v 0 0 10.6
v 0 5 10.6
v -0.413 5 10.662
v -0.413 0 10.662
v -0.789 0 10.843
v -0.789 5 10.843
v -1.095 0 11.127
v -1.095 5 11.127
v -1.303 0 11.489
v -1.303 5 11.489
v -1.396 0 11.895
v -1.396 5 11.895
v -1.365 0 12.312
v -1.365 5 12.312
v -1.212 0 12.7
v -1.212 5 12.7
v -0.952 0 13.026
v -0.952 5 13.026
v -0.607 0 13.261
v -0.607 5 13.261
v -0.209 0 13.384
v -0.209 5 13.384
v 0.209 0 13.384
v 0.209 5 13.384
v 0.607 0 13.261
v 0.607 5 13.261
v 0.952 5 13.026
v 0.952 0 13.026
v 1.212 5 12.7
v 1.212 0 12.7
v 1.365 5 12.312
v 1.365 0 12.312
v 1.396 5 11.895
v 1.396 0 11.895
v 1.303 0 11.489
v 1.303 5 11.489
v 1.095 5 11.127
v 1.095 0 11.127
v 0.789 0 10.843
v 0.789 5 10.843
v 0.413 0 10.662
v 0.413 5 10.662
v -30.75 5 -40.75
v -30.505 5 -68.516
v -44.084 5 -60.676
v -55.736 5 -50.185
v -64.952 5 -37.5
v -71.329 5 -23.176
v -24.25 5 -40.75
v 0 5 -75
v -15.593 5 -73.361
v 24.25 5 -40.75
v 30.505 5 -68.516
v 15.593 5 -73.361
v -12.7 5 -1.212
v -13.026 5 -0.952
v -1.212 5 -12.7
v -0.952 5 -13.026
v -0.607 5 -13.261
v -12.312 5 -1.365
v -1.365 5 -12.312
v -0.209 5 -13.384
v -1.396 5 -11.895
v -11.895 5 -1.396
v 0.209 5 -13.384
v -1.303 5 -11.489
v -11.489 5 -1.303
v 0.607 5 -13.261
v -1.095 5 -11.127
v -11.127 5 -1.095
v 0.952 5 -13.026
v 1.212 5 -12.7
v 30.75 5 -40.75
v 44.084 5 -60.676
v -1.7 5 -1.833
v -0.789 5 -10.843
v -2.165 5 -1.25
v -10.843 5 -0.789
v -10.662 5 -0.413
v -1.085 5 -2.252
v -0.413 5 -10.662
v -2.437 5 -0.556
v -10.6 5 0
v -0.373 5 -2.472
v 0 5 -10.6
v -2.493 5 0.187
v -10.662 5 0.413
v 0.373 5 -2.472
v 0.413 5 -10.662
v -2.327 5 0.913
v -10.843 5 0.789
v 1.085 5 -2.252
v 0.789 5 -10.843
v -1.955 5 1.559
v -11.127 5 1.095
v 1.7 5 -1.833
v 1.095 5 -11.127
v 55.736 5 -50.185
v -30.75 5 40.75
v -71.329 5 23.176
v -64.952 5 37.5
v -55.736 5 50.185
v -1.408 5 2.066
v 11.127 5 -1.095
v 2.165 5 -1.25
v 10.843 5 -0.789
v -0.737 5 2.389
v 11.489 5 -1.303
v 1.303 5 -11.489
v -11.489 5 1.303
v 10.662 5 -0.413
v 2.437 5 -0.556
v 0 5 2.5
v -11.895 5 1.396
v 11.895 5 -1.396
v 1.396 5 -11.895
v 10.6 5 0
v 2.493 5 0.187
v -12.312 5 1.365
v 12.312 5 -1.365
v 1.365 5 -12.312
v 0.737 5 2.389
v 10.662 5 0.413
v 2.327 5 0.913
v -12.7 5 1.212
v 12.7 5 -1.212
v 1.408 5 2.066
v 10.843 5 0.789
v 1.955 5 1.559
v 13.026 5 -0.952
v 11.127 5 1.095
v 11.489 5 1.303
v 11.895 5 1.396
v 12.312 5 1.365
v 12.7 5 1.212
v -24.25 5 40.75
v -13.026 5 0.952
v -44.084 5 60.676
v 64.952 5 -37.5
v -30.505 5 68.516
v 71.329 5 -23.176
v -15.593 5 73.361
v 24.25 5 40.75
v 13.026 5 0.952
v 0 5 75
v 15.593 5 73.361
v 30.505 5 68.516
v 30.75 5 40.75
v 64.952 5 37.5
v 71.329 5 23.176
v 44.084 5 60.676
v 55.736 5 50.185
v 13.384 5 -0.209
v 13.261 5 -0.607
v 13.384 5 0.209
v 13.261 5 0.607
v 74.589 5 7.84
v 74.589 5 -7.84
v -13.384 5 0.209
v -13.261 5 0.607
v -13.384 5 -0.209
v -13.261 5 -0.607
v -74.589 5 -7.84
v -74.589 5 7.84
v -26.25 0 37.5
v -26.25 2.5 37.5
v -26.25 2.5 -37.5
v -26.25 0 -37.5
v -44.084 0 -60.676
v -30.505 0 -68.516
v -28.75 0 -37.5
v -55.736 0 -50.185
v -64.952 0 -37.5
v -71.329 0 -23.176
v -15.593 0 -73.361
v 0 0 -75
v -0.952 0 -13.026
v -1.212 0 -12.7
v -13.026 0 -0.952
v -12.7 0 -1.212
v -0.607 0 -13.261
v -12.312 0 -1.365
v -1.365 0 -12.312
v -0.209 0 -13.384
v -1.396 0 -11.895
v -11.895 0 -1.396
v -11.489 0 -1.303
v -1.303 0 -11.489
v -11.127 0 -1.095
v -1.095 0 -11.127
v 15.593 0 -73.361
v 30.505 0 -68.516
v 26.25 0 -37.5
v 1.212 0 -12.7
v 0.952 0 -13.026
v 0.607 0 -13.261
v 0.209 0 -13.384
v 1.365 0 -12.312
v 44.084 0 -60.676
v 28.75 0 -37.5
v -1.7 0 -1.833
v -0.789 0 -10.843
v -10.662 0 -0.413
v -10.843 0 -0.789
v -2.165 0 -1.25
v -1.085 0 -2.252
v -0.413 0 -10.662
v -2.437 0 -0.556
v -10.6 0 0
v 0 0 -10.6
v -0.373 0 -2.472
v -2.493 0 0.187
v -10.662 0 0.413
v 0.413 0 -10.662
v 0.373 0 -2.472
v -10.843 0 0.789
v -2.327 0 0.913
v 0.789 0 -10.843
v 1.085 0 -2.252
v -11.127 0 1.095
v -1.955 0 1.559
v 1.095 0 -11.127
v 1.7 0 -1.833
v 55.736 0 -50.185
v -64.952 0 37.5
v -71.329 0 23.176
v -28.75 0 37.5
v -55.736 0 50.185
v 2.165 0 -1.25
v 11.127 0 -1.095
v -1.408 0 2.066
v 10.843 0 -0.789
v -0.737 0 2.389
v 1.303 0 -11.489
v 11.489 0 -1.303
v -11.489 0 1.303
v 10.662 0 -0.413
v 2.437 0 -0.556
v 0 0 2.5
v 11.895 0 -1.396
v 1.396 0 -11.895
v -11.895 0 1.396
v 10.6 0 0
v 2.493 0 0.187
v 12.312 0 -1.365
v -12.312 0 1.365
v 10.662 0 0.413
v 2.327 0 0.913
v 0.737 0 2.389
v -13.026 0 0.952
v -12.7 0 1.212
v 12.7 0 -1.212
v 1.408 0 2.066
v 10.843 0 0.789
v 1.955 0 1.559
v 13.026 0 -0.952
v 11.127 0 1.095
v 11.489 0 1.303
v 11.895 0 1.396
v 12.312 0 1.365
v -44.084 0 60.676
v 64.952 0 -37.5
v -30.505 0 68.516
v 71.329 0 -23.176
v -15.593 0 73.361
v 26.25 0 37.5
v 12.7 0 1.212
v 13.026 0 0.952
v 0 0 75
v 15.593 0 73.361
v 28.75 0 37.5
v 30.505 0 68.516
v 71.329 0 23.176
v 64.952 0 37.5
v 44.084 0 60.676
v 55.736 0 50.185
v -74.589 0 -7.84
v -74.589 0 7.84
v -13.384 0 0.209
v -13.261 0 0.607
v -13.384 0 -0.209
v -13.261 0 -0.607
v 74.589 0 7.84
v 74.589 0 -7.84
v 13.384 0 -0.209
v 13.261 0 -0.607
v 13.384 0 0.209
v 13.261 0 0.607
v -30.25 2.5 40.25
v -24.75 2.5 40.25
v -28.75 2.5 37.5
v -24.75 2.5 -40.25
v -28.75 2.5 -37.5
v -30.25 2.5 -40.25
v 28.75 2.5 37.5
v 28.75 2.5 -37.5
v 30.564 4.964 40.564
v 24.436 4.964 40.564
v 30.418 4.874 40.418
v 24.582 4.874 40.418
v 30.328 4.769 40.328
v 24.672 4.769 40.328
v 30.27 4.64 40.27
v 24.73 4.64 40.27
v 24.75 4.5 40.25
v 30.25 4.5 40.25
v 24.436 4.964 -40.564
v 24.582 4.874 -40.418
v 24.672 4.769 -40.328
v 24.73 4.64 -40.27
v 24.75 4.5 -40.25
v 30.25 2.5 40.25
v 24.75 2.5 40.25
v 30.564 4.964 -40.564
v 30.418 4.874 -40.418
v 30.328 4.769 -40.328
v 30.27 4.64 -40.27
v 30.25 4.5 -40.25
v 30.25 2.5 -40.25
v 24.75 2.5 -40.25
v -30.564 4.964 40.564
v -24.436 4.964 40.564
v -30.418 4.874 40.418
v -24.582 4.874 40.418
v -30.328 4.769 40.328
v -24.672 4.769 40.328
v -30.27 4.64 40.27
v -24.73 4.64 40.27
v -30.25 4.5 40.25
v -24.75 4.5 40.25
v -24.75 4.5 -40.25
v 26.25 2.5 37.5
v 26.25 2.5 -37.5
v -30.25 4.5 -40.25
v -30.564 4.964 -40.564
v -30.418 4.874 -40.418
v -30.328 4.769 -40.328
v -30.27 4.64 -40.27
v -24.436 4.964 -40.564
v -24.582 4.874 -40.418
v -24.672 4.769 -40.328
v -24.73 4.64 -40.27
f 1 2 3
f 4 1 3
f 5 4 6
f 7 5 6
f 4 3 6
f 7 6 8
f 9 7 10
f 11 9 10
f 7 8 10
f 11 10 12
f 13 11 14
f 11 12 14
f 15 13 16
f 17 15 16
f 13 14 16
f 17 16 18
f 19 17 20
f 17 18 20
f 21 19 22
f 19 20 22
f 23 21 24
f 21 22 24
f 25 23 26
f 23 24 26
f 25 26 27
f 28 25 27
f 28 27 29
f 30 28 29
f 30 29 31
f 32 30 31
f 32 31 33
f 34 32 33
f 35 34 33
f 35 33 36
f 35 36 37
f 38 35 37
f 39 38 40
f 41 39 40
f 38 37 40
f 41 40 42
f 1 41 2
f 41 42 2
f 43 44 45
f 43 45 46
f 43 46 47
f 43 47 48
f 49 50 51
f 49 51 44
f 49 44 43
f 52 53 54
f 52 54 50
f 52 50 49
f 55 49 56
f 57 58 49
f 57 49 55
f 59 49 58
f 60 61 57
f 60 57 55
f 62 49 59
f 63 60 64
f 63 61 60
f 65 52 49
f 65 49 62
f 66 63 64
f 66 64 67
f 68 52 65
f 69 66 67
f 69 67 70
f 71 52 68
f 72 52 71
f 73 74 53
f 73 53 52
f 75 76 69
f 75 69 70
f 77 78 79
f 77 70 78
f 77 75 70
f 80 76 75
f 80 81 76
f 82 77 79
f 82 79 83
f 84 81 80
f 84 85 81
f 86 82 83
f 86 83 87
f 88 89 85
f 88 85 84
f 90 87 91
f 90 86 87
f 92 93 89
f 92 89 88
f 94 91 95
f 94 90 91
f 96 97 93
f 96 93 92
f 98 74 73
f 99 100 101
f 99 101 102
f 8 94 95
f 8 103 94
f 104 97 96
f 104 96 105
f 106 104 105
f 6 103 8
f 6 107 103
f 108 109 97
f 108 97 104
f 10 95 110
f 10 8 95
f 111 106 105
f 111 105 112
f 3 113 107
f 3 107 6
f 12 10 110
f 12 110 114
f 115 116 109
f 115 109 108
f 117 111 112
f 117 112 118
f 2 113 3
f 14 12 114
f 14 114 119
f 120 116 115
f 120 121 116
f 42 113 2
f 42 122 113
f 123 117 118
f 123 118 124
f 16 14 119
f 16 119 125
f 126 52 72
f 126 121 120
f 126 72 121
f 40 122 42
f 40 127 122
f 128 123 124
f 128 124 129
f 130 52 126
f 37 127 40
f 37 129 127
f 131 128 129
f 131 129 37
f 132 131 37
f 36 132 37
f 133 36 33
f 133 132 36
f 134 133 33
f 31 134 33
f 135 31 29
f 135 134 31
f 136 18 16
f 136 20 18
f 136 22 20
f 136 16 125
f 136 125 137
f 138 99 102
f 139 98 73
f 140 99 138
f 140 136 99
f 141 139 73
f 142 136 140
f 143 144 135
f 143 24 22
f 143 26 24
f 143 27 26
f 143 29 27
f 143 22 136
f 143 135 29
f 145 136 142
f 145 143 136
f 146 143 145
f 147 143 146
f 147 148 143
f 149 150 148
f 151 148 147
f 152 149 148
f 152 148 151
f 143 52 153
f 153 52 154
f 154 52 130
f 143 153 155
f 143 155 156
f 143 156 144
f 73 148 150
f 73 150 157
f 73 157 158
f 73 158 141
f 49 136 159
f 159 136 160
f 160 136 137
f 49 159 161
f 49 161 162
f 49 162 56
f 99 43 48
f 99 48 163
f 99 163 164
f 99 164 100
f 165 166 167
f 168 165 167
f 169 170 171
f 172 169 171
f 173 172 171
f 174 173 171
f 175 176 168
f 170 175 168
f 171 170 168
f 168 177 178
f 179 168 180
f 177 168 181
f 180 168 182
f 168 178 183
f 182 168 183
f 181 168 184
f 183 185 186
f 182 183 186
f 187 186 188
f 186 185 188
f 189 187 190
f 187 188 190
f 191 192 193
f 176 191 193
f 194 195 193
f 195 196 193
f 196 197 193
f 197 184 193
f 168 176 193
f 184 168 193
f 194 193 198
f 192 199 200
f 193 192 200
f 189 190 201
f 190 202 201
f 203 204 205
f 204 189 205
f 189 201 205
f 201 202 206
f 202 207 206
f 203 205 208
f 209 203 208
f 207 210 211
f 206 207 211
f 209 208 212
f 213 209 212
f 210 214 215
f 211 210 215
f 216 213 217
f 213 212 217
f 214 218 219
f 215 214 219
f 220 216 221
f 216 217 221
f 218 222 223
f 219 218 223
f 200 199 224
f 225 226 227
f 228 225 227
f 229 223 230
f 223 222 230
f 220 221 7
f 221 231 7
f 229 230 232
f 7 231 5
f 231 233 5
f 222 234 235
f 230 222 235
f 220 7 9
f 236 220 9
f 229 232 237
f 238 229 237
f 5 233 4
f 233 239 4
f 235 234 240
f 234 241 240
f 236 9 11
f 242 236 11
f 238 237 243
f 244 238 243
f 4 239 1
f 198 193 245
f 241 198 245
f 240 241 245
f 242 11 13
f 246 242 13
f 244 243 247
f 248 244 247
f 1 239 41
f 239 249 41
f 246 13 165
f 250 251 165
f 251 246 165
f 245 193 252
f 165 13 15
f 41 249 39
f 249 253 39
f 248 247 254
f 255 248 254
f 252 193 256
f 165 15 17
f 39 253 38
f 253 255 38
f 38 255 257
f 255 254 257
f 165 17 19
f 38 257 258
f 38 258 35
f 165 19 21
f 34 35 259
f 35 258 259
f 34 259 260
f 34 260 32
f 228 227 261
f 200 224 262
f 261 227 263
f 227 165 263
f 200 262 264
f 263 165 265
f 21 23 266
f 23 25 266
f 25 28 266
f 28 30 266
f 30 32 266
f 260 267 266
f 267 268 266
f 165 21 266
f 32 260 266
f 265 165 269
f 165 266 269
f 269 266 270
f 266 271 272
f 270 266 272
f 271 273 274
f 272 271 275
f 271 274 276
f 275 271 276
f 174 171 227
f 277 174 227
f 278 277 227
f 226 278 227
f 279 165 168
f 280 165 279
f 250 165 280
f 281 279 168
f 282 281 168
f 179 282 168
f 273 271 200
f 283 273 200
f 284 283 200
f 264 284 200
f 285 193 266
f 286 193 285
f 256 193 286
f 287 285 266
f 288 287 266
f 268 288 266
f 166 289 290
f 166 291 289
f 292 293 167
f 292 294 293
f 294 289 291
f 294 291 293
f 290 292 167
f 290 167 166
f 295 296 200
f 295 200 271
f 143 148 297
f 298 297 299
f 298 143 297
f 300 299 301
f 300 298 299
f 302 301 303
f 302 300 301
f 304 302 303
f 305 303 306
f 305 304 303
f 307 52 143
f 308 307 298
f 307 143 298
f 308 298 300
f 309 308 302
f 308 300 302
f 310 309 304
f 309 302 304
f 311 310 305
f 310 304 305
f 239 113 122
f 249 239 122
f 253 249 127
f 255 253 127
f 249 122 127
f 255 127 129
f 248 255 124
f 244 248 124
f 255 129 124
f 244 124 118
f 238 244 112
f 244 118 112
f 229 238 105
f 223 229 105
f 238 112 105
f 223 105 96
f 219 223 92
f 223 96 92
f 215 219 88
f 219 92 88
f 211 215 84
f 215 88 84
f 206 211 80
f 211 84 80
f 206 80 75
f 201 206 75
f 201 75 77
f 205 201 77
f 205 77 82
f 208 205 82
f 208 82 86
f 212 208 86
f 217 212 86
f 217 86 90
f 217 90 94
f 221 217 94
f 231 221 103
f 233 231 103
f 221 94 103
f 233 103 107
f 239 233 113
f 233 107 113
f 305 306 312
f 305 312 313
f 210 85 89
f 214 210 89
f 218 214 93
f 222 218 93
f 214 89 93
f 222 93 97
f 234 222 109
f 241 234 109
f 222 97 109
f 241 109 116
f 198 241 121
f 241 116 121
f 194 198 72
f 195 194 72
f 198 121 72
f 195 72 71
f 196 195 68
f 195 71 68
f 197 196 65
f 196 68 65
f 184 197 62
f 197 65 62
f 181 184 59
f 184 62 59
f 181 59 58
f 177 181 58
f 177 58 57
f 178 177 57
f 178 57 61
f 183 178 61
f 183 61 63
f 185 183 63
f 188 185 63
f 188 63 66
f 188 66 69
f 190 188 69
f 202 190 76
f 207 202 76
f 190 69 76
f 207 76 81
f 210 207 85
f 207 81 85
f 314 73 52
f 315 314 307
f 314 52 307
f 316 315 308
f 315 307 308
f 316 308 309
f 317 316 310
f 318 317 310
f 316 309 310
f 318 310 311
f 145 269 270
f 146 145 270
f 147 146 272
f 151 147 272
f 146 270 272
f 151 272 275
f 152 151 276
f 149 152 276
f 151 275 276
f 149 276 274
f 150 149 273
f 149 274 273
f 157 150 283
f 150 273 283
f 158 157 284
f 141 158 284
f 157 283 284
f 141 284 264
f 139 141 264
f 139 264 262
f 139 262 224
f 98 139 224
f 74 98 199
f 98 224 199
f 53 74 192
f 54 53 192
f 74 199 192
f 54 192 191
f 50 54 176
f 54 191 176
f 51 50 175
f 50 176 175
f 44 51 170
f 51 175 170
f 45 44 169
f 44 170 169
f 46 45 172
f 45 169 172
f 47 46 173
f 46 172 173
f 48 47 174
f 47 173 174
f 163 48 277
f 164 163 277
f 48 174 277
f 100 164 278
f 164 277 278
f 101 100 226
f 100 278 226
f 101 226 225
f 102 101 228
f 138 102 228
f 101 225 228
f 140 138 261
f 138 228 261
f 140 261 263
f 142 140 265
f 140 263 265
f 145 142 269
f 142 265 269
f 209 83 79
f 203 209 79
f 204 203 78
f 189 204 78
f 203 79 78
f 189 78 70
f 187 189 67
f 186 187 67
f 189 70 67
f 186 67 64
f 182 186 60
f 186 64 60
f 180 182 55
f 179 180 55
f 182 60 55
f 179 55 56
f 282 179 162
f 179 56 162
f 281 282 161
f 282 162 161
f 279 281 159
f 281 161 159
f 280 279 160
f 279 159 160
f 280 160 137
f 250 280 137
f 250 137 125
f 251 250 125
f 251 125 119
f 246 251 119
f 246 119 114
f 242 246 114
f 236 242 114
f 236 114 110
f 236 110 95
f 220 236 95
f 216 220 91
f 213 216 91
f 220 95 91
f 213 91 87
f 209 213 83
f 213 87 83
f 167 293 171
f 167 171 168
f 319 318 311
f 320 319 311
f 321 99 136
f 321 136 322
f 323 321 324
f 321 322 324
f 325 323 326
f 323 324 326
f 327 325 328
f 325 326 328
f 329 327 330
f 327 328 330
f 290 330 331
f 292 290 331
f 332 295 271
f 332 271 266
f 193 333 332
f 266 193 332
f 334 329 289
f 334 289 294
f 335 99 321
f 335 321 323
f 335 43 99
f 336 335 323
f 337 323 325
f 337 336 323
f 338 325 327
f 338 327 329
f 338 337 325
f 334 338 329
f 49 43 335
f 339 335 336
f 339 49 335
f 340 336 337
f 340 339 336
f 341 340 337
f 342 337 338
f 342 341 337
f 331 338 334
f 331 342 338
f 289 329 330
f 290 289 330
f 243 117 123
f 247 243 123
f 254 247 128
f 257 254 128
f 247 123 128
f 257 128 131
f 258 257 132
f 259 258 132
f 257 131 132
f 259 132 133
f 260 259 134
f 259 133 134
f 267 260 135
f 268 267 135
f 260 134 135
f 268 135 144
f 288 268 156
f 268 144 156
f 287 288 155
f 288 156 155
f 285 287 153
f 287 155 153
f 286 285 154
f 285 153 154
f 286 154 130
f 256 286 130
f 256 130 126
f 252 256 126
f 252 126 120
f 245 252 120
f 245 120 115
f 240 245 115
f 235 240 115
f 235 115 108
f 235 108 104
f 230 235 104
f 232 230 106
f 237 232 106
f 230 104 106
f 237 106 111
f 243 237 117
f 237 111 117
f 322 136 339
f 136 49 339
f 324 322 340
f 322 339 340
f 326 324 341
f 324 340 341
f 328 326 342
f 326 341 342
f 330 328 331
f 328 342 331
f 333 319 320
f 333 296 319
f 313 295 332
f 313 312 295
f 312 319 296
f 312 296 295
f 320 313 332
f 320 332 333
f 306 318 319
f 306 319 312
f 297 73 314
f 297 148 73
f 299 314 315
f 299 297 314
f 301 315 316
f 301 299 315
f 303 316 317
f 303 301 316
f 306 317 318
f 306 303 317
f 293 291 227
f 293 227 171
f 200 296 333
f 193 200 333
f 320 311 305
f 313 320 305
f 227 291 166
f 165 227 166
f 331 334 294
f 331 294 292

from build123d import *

# Parameters (mm, degrees)
SKETCH1_R                = 75
BOSS_EXTRUDE1_DEPTH      = 5
SKETCH2_R                = 2.5
CUT_EXTRUDE1_DEPTH       = 5
SKETCH3_R                = 1.4
CUT_EXTRUDE2_DEPTH       = 5
CIRPATTERN1_COUNT        = 4
SKETCH4_W                = 5.5
SKETCH4_H                = 80.5
CUT_EXTRUDE3_DEPTH       = 2.5
SKETCH5_W                = 2.5
SKETCH5_H                = 75
CUT_EXTRUDE4_DEPTH       = 2.5
FILLET1_R                = 0.5
CIRPATTERN2_COUNT        = 2
FILLET1_OF_CIRPATTERN2_R = 0.5


with BuildPart() as part:
    # Sketch1 → Boss-Extrude1 (new body)
    with BuildSketch(Plane(origin=(0, 0, 0), x_dir=(1, 0, 0), z_dir=(0, 1, 0))):
        with Locations(Location((0, 0, 0), (0, 0, 270))):
            Circle(SKETCH1_R)
    extrude(amount=BOSS_EXTRUDE1_DEPTH)

    # Sketch2 → Cut-Extrude1 (cut)
    with BuildSketch(Plane(origin=(0, 5, 0), x_dir=(1, 0, 0), z_dir=(0, 1, 0))):
        with Locations(Location((0, 0, 0), (0, 0, 270))):
            Circle(SKETCH2_R)
    extrude(amount=-CUT_EXTRUDE1_DEPTH, mode=Mode.SUBTRACT)

    # Sketch3 → Cut-Extrude2 (cut)
    with BuildSketch(Plane(origin=(0, 5, 0), x_dir=(1, 0, 0), z_dir=(0, 1, 0))):
        with Locations(Location((0, 12, 0), (0, 0, 270))):
            Circle(SKETCH3_R)
    cut_extrude2 = extrude(amount=-CUT_EXTRUDE2_DEPTH, mode=Mode.SUBTRACT)

    # CirPattern1: Cut-Extrude2 ×4 about axis
    cirpattern1_axis = Axis((0, 0, 0), (0, 1, 0))
    for i in range(1, CIRPATTERN1_COUNT):
        add(cut_extrude2.rotate(cirpattern1_axis, i * 360 / CIRPATTERN1_COUNT), mode=Mode.SUBTRACT)

    # Sketch4 → Cut-Extrude3 (cut)
    with BuildSketch(Plane(origin=(0, 5, 0), x_dir=(1, 0, 0), z_dir=(0, 1, 0))):
        with Locations((-27.5, 0)):
            Rectangle(SKETCH4_W, SKETCH4_H)
    cut_extrude3 = extrude(amount=-CUT_EXTRUDE3_DEPTH, mode=Mode.SUBTRACT)

    # Sketch5 → Cut-Extrude4 (cut)
    with BuildSketch(Plane(origin=(0, 2.5, 0), x_dir=(1, 0, 0), z_dir=(0, 1, 0))):
        with Locations((-27.5, 0)):
            Rectangle(SKETCH5_W, SKETCH5_H)
    cut_extrude4 = extrude(amount=-CUT_EXTRUDE4_DEPTH, mode=Mode.SUBTRACT)

    # Fillet1
    fillet1_edges = [part.edges().sort_by_distance(p)[0] for p in [
        (-24.75, 5, 0),
        (-27.5, 5, -40.25),
        (-30.25, 5, 0),
        (-27.5, 5, 40.25),
    ]]
    fillet(fillet1_edges, radius=FILLET1_R)

    # CirPattern2: Cut-Extrude3, Cut-Extrude4 ×2 about axis
    cirpattern2_axis = Axis((0, 0, 0), (0, 1, 0))
    add([cut_extrude3.rotate(cirpattern2_axis, i * 360 / CIRPATTERN2_COUNT) for i in range(1, CIRPATTERN2_COUNT)], mode=Mode.SUBTRACT)
    add([cut_extrude4.rotate(cirpattern2_axis, i * 360 / CIRPATTERN2_COUNT) for i in range(1, CIRPATTERN2_COUNT)], mode=Mode.SUBTRACT)

    # Fillet1 of CirPattern2
    fillet1_of_cirpattern2_edges = [part.edges().sort_by_distance(p)[0] for p in [
        (24.75, 5, 0),
        (27.5, 5, 40.25),
        (30.25, 5, 0),
        (27.5, 5, -40.25),
    ]]
    fillet(fillet1_of_cirpattern2_edges, radius=FILLET1_OF_CIRPATTERN2_R)


solid = part.part
